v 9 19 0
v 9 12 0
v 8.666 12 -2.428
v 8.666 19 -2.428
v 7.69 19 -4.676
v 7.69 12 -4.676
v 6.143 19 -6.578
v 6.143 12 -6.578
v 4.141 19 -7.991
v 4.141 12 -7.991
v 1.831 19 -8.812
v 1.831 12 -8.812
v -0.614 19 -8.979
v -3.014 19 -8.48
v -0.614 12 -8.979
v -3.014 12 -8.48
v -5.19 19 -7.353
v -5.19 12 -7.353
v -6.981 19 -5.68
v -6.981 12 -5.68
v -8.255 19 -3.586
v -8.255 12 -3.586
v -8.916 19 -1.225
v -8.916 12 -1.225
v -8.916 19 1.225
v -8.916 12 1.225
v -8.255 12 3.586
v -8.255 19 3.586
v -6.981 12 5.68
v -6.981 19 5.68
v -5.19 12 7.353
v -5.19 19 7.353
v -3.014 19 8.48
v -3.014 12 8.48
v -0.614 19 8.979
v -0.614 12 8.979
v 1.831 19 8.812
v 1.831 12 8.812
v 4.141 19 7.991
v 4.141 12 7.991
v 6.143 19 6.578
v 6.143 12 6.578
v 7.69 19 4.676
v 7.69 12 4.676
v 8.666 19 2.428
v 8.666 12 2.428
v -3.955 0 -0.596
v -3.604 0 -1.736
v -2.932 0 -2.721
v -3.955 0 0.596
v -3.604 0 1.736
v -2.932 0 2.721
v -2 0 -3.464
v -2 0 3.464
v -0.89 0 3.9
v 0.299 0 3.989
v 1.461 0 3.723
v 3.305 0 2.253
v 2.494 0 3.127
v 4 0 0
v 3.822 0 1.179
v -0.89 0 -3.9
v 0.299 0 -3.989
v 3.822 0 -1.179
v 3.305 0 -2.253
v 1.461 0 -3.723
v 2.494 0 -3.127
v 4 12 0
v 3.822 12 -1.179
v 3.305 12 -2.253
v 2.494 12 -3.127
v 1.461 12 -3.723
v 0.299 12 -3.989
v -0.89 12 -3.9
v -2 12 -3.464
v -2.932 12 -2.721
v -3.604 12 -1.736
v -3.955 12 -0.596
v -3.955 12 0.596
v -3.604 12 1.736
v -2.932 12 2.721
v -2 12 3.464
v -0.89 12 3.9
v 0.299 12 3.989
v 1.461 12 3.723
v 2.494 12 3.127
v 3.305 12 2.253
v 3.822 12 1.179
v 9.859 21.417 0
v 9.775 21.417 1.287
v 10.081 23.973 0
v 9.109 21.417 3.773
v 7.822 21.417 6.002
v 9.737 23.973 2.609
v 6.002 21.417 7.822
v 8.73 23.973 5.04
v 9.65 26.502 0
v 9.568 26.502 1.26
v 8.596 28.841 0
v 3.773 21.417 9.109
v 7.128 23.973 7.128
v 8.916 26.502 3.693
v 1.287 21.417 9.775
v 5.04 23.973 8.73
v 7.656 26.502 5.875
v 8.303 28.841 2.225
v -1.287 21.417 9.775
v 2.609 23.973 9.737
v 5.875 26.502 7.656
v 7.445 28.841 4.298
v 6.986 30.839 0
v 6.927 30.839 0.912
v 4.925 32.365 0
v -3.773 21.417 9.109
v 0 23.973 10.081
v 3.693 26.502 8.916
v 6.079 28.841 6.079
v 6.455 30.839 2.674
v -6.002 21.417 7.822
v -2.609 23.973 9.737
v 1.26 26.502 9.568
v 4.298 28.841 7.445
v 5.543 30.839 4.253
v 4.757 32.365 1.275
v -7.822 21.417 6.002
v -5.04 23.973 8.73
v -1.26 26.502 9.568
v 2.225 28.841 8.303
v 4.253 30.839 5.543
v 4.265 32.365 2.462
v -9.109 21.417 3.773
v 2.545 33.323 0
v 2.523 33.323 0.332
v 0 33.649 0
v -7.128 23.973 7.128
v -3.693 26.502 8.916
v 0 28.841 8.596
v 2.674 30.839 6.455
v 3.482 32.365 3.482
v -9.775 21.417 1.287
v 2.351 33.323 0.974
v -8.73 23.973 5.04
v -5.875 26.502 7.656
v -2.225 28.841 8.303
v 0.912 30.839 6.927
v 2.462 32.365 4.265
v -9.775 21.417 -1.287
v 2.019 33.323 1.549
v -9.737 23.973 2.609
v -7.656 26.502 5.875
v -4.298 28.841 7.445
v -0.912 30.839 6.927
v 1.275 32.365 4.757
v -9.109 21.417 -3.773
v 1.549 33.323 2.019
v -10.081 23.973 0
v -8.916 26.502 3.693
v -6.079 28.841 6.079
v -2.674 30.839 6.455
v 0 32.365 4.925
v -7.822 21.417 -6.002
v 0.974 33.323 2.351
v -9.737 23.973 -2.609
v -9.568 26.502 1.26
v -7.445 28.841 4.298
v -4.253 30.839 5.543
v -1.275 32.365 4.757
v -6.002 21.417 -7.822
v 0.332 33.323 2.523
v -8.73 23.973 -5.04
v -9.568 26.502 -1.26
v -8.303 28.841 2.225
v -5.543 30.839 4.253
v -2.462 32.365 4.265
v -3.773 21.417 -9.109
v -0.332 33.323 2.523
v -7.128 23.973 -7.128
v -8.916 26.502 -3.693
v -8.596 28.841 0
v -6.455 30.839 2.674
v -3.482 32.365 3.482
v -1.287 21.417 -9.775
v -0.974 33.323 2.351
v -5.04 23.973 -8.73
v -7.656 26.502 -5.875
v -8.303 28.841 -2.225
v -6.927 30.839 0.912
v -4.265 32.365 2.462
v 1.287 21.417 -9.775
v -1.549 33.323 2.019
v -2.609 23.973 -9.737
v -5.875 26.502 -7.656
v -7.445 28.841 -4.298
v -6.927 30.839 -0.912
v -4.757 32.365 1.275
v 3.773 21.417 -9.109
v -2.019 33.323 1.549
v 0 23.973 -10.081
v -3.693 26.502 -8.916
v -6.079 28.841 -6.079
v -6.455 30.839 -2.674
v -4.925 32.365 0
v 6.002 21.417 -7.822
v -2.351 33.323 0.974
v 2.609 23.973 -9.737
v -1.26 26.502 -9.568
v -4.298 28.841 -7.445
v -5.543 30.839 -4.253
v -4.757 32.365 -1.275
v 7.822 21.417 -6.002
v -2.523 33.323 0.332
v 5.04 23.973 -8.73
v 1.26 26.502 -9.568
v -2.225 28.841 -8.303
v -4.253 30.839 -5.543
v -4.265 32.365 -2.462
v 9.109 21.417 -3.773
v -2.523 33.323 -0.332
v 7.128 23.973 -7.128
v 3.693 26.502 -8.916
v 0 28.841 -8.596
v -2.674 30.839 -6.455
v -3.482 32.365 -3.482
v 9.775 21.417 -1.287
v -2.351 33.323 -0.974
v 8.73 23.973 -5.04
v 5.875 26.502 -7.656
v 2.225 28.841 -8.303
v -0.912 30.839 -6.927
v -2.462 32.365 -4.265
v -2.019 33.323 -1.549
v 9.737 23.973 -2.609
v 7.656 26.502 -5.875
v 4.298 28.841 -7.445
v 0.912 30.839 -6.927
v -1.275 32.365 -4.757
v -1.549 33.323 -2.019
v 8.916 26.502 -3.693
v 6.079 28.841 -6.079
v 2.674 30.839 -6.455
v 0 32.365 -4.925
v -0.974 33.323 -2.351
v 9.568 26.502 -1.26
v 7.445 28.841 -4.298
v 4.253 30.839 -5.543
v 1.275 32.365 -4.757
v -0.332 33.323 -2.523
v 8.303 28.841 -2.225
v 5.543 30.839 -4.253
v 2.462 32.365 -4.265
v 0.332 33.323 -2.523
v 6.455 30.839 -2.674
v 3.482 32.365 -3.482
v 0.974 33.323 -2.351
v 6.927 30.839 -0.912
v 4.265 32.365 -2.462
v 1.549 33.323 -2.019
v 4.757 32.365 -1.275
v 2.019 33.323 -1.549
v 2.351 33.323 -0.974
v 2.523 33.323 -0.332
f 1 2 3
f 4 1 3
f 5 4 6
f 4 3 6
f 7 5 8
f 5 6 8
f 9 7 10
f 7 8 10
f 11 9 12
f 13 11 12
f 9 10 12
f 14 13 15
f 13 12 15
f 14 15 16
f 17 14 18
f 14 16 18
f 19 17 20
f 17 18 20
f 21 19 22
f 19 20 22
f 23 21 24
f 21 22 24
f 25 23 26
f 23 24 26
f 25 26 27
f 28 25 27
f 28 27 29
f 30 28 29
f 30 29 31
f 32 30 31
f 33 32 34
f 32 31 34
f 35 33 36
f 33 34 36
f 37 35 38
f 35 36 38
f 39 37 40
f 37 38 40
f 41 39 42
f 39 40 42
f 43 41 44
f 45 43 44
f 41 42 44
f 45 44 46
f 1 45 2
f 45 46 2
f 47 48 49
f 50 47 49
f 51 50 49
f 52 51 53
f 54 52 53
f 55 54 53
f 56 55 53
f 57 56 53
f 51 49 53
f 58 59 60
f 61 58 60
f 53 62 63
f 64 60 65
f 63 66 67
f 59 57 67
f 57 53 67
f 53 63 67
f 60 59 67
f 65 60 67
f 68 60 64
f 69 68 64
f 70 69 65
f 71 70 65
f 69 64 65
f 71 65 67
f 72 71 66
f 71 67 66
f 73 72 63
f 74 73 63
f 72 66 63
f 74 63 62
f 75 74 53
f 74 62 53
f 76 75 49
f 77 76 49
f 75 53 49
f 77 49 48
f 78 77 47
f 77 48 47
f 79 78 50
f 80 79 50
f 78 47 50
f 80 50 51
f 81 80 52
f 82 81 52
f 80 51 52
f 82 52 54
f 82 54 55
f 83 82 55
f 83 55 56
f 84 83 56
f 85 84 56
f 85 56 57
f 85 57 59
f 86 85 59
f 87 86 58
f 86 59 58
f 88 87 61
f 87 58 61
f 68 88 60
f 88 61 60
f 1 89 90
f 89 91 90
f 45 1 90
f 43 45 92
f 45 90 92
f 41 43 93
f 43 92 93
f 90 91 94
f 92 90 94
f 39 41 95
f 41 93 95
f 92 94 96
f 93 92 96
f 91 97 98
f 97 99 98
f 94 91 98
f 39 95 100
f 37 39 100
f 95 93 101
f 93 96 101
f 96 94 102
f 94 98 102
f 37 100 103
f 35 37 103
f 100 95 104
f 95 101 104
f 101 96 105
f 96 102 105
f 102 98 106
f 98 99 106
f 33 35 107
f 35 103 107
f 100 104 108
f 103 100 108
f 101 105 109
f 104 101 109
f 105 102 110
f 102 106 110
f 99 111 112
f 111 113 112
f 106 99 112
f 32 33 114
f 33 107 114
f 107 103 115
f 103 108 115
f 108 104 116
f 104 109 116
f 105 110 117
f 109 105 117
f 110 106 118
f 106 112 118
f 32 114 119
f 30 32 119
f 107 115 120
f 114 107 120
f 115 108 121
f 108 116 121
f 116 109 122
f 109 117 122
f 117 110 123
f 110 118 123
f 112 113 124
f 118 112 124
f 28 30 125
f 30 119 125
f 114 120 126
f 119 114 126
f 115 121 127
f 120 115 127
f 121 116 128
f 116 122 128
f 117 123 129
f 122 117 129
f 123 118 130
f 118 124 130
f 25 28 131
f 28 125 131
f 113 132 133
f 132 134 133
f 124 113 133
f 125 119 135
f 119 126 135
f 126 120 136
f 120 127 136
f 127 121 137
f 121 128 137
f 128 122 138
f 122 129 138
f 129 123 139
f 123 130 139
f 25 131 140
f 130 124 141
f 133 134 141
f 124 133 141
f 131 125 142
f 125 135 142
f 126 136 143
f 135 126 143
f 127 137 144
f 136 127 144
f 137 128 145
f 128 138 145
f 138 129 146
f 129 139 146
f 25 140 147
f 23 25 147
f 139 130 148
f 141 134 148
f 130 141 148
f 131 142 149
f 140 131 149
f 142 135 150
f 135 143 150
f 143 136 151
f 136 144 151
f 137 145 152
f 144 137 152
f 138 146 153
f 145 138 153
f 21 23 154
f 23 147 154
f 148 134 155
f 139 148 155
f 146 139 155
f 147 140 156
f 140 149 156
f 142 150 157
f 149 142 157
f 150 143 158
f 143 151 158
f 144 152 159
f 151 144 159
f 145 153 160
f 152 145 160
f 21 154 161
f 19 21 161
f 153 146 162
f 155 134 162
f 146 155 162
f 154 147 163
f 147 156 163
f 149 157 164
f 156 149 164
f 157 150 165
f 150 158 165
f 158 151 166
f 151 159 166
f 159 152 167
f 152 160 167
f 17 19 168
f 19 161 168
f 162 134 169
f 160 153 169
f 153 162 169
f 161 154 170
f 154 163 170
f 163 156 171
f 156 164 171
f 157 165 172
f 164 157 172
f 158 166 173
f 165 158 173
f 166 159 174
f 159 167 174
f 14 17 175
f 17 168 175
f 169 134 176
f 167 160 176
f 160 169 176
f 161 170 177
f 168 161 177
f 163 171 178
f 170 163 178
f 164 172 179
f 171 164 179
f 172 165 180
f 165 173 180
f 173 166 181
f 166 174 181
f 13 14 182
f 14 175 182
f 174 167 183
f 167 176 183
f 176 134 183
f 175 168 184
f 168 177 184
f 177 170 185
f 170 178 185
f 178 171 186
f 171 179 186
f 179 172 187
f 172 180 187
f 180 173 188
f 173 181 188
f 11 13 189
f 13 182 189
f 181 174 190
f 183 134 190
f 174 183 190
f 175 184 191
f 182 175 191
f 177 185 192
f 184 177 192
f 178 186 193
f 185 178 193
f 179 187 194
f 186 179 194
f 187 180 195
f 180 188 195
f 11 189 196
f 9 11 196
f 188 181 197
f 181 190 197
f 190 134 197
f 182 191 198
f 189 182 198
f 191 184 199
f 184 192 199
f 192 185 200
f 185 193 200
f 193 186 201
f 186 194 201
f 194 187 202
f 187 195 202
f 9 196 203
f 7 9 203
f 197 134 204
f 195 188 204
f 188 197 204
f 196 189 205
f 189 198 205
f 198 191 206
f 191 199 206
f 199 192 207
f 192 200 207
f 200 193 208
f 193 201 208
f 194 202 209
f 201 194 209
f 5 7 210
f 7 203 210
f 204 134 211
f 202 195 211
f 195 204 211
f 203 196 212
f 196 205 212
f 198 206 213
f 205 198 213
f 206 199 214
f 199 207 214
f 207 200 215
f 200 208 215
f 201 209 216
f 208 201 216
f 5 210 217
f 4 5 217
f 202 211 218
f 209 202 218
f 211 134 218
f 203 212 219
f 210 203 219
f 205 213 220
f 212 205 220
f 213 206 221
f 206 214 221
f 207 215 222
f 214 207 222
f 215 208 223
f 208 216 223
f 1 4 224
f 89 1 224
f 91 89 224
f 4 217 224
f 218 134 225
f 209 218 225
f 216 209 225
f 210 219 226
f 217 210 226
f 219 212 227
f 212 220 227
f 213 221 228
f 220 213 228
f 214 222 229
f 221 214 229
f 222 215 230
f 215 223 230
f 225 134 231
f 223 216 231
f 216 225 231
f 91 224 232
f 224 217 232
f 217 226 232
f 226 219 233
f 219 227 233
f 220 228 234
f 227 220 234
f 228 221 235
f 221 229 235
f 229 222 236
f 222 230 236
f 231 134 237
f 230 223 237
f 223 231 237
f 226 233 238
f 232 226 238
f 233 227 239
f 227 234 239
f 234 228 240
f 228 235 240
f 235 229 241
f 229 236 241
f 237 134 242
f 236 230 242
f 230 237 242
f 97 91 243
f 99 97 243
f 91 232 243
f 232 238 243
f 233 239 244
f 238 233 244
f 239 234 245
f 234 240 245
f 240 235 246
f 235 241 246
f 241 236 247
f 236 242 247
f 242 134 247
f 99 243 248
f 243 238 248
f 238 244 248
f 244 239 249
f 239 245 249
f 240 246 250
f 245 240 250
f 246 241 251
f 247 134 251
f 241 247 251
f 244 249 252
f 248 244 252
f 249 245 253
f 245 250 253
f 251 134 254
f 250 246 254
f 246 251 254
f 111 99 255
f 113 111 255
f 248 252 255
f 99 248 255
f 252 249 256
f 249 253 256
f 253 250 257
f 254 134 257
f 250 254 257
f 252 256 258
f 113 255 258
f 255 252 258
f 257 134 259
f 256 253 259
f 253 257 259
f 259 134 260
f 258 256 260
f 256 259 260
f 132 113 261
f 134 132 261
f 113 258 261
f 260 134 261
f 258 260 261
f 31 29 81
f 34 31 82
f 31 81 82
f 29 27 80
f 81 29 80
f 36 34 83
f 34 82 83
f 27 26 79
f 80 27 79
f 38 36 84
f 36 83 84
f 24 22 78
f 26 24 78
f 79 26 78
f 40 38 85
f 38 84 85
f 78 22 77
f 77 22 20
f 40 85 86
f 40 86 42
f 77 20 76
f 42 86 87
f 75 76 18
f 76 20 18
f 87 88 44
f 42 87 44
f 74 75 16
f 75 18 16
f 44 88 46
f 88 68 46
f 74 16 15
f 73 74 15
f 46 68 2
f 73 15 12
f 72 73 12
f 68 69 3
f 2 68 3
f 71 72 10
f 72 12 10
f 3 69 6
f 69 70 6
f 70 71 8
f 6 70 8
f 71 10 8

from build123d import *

# Parameters (mm, degrees)
SKETCH1_R           = 4
BOSS_EXTRUDE1_DEPTH = 12
SKETCH3_R           = 9
BOSS_EXTRUDE2_DEPTH = 7


with BuildPart() as part:
    # Sketch1 → Boss-Extrude1 (new body)
    with BuildSketch(Plane(origin=(0, 0, 0), x_dir=(1, 0, 0), z_dir=(0, 1, 0))):
        Circle(SKETCH1_R)
    extrude(amount=BOSS_EXTRUDE1_DEPTH)

    # Sketch3 → Boss-Extrude2 (add)
    with BuildSketch(Plane(origin=(0, 12, 0), x_dir=(1, 0, 0), z_dir=(0, 1, 0))):
        Circle(SKETCH3_R)
    extrude(amount=BOSS_EXTRUDE2_DEPTH)

    # Sketch4 → Revolve2 (revolve)
    with BuildSketch(Plane.XY):
        with BuildLine():
            Line((0, 28.11938617), (0, 19))
            Line((0, 19), (9, 19))
            ThreePointArc((9, 19), (8.596342111, 28.841142067), (0, 33.648835815))
            Line((0, 33.648835815), (0, 28.11938617))
        make_face()
    revolve(axis=Axis((0, 28.11938617, 0), (0, -1, 0)))


solid = part.part
